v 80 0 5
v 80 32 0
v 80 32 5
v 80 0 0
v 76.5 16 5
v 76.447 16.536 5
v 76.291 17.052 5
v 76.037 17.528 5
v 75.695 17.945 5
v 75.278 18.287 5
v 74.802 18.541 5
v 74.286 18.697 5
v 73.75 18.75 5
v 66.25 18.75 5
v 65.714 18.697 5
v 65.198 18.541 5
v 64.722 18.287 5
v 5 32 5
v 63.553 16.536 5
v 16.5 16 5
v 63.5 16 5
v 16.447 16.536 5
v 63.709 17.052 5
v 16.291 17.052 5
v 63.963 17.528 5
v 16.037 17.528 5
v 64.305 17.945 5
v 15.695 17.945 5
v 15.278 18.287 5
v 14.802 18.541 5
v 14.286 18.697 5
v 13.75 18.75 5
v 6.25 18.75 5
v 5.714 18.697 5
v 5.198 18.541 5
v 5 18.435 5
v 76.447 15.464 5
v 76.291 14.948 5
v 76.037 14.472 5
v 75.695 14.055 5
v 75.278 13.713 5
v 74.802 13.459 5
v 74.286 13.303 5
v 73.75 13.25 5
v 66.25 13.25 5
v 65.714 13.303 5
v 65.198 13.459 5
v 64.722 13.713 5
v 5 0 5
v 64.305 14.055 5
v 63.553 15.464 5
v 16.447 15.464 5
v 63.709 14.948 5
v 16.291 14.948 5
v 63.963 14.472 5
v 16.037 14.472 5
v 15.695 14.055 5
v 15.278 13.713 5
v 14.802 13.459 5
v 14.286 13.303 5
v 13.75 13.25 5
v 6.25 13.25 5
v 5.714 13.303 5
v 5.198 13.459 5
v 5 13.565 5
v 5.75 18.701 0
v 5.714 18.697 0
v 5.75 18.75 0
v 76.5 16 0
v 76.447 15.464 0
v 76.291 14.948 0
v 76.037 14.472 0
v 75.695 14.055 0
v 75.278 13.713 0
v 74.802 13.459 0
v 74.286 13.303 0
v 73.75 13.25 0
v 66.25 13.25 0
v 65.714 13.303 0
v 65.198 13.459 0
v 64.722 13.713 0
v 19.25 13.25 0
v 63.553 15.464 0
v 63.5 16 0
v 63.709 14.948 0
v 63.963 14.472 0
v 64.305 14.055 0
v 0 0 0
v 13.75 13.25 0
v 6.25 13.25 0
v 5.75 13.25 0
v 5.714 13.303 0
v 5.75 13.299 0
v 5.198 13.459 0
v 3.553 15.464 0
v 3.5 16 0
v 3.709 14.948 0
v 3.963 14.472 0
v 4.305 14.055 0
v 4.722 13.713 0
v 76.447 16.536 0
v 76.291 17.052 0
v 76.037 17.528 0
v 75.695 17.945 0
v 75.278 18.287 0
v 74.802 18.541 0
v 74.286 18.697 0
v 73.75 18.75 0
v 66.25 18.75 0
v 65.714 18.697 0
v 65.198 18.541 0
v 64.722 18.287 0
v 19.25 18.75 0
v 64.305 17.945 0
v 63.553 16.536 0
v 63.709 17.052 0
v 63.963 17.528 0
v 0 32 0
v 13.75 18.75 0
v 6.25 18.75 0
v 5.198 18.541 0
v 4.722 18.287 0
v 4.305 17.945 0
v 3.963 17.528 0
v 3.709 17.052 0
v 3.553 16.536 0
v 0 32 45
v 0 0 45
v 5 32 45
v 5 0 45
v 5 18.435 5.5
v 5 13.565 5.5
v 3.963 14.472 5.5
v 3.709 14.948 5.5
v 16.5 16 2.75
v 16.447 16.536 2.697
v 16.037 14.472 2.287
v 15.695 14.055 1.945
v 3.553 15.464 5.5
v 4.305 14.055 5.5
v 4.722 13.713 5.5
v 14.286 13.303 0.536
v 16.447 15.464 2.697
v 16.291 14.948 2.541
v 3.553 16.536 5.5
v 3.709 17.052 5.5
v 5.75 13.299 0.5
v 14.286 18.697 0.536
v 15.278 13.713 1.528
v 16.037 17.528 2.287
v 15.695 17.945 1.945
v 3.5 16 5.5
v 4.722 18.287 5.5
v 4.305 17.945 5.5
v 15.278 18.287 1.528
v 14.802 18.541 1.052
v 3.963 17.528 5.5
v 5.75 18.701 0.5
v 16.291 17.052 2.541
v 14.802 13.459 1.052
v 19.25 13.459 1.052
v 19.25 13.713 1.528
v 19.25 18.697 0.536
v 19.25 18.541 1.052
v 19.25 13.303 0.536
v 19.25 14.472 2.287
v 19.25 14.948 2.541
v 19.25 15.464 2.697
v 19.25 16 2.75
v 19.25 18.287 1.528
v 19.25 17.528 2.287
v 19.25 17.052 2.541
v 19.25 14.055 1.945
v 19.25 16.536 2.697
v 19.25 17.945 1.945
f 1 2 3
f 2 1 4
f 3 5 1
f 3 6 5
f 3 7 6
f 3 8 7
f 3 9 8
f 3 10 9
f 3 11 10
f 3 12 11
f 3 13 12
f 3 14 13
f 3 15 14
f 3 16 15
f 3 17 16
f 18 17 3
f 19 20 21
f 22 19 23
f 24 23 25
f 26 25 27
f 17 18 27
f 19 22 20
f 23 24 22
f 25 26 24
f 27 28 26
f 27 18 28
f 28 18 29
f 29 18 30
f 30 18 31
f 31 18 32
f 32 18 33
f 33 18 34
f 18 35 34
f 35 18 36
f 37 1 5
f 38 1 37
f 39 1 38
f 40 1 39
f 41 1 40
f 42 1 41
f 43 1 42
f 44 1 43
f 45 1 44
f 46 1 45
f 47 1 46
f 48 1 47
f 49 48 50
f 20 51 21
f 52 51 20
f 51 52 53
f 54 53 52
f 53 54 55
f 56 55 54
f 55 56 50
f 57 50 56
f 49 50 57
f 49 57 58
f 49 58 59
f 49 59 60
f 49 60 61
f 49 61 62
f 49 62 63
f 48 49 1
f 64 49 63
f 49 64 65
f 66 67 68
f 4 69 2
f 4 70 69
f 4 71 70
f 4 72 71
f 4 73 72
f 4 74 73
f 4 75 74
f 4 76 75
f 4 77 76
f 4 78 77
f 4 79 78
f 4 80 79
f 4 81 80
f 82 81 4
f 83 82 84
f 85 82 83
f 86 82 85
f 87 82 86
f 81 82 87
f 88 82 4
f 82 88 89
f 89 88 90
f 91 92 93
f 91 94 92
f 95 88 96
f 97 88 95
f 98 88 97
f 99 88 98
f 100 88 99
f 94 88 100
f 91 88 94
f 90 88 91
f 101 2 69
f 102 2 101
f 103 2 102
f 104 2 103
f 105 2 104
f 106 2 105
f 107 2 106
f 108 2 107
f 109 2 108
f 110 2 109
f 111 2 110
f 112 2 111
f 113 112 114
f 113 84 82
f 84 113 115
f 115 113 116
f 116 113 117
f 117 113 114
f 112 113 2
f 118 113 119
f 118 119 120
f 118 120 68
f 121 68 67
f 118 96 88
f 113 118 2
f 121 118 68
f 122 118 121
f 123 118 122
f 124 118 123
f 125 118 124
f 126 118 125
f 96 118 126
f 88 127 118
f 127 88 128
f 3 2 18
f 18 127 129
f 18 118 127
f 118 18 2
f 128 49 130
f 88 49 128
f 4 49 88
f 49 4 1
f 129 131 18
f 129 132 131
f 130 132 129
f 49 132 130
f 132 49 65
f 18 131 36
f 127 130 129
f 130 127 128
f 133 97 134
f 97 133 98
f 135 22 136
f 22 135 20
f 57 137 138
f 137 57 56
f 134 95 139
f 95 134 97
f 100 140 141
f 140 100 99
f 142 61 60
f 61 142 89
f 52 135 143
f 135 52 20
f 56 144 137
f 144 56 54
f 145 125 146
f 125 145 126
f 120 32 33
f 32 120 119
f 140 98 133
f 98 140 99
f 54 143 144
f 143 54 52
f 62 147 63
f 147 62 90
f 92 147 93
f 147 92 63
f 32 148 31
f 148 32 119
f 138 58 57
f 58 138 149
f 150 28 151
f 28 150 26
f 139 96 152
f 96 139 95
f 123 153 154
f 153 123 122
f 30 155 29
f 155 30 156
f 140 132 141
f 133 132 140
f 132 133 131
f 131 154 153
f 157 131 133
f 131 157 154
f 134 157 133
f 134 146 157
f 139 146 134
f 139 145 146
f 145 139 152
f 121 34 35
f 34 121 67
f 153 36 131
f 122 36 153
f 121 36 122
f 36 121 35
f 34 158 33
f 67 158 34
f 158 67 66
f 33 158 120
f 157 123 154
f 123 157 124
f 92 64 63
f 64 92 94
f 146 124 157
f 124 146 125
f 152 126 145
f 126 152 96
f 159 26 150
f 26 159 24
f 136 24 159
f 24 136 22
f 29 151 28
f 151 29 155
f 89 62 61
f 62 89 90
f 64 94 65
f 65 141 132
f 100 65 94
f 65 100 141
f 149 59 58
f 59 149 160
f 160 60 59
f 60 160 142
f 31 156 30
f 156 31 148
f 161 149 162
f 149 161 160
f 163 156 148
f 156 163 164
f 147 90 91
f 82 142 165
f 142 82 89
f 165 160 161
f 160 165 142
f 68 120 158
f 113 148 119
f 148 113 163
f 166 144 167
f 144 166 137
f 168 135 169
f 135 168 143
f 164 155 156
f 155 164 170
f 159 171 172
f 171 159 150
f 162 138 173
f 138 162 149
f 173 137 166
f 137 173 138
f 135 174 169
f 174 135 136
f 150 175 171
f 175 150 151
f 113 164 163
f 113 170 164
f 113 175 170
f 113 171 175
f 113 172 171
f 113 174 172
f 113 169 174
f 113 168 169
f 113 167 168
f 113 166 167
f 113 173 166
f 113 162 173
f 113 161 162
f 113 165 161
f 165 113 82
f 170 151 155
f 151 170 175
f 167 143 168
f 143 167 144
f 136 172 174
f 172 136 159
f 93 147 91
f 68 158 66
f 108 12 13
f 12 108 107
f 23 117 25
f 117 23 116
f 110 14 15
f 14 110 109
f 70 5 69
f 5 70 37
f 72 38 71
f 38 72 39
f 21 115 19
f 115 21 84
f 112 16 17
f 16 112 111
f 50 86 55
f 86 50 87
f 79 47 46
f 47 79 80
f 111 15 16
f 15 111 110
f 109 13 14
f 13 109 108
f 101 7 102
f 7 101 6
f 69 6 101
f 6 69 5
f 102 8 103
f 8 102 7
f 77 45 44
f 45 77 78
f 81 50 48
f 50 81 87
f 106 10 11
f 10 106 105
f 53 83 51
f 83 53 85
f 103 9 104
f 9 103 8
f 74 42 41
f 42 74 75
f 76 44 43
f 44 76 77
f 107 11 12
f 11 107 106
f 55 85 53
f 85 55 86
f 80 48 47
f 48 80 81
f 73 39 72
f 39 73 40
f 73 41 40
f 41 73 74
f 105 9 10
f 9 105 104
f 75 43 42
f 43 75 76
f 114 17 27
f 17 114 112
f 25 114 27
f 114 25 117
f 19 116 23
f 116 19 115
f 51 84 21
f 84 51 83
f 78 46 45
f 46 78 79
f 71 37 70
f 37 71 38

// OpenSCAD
$fn = 32;

// ----------------------------------------------------------------------
// L-bracket: 80 x 32 x 45 mm
// ----------------------------------------------------------------------

// --- parameters (mm) ---
leg_a = 80;               // horizontal leg, X
leg_b = 45;               // vertical leg, Z
depth = 32;               // bracket depth, Y
thick = 5;                // plate thickness
hole_d = 4.5;             // clearance for M4
slot_w = 5.5;             // euro screw slot width
slot_l = 13;              // euro screw slot length

module hole_z(px, py) {
  translate([px, py, -0.5]) cylinder(h = thick + 1, d = hole_d);
}
module hole_x(pz, py) {
  translate([-0.5, py, pz]) rotate([0, 90, 0]) cylinder(h = thick + 1, d = hole_d);
}
module euro_slot_z(px, py) {
  hull() {
    translate([px - (slot_l - slot_w) / 2, py, -0.5]) cylinder(h = thick + 1, d = slot_w);
    translate([px + (slot_l - slot_w) / 2, py, -0.5]) cylinder(h = thick + 1, d = slot_w);
  }
}
module euro_slot_x(pz, py) {
  translate([-0.5, 0, 0]) rotate([0, 90, 0]) hull() {
    translate([0, py, pz - (slot_l - slot_w) / 2]) cylinder(h = thick + 1, d = slot_w);
    translate([0, py, pz + (slot_l - slot_w) / 2]) cylinder(h = thick + 1, d = slot_w);
  }
}

difference() {
  union() {
    /* horizontal leg */
    cube([leg_a, depth, thick]);
    /* vertical leg, overlapping the corner block */
    cube([thick, depth, leg_b]);
  }
  euro_slot_z(10, 16);
  euro_slot_x(10, 16);
  euro_slot_z(70, 16);
}
